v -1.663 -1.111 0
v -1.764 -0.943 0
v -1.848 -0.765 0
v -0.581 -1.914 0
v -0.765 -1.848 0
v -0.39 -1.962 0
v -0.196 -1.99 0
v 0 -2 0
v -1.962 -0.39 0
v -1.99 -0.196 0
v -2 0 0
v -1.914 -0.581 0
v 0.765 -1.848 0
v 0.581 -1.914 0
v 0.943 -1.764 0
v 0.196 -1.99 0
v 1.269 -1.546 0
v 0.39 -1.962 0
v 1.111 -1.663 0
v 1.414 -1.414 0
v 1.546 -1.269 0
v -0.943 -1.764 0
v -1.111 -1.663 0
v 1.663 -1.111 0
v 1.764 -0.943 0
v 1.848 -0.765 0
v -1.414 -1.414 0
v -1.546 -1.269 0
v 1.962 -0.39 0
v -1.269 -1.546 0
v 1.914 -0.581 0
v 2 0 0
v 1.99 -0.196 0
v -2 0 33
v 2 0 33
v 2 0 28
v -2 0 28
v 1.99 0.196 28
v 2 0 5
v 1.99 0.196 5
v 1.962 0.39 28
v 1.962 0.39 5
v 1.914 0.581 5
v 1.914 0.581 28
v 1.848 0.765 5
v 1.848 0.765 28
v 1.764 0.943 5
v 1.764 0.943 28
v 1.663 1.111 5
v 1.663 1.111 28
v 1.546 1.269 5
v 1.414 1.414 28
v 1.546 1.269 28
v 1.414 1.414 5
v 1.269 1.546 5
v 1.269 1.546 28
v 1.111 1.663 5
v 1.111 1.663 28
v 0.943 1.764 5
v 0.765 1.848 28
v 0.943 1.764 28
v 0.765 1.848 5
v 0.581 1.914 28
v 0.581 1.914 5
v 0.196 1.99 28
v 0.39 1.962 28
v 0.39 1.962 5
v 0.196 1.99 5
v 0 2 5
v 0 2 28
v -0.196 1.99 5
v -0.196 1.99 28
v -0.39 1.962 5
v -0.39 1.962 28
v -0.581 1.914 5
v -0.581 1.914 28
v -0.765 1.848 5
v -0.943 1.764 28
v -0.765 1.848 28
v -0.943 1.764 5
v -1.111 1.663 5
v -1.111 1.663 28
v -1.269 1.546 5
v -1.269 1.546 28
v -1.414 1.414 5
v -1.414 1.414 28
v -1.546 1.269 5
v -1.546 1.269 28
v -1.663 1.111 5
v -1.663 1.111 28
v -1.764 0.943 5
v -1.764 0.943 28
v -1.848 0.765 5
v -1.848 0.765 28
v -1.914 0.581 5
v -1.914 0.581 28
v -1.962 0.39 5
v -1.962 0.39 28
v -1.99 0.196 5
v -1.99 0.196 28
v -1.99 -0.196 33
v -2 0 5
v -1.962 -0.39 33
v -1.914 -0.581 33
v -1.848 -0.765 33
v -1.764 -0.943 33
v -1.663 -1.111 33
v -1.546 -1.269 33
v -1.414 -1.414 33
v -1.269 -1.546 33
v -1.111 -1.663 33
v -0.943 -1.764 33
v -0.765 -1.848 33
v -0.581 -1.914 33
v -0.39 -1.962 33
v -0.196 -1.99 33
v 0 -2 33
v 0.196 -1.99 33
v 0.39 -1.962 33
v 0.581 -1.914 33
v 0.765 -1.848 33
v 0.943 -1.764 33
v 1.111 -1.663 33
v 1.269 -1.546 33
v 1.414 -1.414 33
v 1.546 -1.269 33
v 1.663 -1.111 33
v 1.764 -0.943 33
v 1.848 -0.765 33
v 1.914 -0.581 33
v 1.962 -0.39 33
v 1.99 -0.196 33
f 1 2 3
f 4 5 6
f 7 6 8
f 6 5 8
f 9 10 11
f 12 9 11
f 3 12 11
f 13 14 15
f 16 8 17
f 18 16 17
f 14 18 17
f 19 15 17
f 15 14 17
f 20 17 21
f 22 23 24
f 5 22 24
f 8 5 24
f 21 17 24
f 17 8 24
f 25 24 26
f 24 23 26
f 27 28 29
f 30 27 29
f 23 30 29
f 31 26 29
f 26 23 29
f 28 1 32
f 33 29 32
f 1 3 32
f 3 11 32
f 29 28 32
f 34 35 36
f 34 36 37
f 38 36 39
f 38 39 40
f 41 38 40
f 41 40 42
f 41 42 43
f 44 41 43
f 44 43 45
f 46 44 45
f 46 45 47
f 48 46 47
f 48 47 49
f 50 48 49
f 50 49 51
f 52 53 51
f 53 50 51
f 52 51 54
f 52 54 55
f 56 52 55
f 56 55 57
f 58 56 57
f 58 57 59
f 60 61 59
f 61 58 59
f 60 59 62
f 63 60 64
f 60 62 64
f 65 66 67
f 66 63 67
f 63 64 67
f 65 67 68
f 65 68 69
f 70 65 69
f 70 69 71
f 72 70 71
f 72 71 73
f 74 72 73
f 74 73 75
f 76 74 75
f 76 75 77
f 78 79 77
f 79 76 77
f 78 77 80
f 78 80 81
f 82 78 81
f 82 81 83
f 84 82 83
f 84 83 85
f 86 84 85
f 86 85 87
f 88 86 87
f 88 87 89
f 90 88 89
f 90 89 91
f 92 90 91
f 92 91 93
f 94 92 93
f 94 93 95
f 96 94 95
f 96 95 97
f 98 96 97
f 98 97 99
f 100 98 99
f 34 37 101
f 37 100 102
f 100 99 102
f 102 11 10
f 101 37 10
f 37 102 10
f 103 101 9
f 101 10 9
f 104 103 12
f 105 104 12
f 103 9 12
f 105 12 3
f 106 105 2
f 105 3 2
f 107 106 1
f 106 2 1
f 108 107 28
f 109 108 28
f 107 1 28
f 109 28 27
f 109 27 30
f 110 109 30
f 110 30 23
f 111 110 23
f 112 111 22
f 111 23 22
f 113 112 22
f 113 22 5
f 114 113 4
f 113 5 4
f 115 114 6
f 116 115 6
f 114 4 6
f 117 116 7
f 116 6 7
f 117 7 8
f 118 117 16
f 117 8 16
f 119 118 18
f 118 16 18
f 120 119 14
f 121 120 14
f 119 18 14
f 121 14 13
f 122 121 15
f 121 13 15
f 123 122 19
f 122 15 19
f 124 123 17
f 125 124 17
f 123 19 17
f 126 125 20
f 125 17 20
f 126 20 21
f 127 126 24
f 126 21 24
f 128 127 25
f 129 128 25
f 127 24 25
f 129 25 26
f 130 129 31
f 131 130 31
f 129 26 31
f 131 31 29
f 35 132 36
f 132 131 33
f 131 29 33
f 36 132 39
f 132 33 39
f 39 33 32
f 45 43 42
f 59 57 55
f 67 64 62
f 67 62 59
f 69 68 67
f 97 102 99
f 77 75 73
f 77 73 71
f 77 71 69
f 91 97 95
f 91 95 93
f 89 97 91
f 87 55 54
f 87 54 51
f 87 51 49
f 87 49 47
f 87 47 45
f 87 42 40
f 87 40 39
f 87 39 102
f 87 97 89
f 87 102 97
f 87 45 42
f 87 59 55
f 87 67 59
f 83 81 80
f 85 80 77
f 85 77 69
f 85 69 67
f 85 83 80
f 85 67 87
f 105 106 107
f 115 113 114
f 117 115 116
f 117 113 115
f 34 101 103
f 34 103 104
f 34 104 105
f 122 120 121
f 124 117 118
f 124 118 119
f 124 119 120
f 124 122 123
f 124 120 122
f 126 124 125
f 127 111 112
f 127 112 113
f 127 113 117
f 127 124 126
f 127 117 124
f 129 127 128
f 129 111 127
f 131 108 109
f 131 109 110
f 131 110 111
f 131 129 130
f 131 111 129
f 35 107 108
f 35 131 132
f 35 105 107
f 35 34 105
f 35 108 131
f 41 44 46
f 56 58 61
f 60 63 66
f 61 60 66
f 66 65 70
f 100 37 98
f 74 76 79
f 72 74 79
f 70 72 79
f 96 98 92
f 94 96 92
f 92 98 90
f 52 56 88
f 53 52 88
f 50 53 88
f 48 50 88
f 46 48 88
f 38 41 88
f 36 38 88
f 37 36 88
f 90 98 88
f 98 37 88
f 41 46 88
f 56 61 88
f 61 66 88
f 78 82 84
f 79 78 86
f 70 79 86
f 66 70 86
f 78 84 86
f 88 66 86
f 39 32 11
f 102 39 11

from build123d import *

# Parameters (mm, degrees)
ESQUISSE1_R             = 2
BOSS_EXTRU_1_DEPTH      = 33
ESQUISSE2_W             = 4
ESQUISSE2_H             = 3
ENL_V_MAT_EXTRU_1_DEPTH = 5


with BuildPart() as part:
    # Esquisse1 → Boss.-Extru.1 (new body)
    with BuildSketch(Plane.XY):
        Circle(ESQUISSE1_R)
    extrude(amount=BOSS_EXTRU_1_DEPTH)

    # Esquisse2 → Enlèv. mat.-Extru.1 (cut)
    with BuildSketch(Plane(origin=(0, 0, 0), x_dir=(-1, 0, 0), z_dir=(0, 0, -1))):
        with Locations((0, 1.5)):
            Rectangle(ESQUISSE2_W, ESQUISSE2_H)
    enl_v_mat_extru_1 = extrude(amount=-ENL_V_MAT_EXTRU_1_DEPTH, mode=Mode.SUBTRACT)

    # Symétrie1: Enlèv. mat.-Extru.1 across plane
    add(enl_v_mat_extru_1.mirror(Plane.XY.offset(16.5)), mode=Mode.SUBTRACT)


solid = part.part
